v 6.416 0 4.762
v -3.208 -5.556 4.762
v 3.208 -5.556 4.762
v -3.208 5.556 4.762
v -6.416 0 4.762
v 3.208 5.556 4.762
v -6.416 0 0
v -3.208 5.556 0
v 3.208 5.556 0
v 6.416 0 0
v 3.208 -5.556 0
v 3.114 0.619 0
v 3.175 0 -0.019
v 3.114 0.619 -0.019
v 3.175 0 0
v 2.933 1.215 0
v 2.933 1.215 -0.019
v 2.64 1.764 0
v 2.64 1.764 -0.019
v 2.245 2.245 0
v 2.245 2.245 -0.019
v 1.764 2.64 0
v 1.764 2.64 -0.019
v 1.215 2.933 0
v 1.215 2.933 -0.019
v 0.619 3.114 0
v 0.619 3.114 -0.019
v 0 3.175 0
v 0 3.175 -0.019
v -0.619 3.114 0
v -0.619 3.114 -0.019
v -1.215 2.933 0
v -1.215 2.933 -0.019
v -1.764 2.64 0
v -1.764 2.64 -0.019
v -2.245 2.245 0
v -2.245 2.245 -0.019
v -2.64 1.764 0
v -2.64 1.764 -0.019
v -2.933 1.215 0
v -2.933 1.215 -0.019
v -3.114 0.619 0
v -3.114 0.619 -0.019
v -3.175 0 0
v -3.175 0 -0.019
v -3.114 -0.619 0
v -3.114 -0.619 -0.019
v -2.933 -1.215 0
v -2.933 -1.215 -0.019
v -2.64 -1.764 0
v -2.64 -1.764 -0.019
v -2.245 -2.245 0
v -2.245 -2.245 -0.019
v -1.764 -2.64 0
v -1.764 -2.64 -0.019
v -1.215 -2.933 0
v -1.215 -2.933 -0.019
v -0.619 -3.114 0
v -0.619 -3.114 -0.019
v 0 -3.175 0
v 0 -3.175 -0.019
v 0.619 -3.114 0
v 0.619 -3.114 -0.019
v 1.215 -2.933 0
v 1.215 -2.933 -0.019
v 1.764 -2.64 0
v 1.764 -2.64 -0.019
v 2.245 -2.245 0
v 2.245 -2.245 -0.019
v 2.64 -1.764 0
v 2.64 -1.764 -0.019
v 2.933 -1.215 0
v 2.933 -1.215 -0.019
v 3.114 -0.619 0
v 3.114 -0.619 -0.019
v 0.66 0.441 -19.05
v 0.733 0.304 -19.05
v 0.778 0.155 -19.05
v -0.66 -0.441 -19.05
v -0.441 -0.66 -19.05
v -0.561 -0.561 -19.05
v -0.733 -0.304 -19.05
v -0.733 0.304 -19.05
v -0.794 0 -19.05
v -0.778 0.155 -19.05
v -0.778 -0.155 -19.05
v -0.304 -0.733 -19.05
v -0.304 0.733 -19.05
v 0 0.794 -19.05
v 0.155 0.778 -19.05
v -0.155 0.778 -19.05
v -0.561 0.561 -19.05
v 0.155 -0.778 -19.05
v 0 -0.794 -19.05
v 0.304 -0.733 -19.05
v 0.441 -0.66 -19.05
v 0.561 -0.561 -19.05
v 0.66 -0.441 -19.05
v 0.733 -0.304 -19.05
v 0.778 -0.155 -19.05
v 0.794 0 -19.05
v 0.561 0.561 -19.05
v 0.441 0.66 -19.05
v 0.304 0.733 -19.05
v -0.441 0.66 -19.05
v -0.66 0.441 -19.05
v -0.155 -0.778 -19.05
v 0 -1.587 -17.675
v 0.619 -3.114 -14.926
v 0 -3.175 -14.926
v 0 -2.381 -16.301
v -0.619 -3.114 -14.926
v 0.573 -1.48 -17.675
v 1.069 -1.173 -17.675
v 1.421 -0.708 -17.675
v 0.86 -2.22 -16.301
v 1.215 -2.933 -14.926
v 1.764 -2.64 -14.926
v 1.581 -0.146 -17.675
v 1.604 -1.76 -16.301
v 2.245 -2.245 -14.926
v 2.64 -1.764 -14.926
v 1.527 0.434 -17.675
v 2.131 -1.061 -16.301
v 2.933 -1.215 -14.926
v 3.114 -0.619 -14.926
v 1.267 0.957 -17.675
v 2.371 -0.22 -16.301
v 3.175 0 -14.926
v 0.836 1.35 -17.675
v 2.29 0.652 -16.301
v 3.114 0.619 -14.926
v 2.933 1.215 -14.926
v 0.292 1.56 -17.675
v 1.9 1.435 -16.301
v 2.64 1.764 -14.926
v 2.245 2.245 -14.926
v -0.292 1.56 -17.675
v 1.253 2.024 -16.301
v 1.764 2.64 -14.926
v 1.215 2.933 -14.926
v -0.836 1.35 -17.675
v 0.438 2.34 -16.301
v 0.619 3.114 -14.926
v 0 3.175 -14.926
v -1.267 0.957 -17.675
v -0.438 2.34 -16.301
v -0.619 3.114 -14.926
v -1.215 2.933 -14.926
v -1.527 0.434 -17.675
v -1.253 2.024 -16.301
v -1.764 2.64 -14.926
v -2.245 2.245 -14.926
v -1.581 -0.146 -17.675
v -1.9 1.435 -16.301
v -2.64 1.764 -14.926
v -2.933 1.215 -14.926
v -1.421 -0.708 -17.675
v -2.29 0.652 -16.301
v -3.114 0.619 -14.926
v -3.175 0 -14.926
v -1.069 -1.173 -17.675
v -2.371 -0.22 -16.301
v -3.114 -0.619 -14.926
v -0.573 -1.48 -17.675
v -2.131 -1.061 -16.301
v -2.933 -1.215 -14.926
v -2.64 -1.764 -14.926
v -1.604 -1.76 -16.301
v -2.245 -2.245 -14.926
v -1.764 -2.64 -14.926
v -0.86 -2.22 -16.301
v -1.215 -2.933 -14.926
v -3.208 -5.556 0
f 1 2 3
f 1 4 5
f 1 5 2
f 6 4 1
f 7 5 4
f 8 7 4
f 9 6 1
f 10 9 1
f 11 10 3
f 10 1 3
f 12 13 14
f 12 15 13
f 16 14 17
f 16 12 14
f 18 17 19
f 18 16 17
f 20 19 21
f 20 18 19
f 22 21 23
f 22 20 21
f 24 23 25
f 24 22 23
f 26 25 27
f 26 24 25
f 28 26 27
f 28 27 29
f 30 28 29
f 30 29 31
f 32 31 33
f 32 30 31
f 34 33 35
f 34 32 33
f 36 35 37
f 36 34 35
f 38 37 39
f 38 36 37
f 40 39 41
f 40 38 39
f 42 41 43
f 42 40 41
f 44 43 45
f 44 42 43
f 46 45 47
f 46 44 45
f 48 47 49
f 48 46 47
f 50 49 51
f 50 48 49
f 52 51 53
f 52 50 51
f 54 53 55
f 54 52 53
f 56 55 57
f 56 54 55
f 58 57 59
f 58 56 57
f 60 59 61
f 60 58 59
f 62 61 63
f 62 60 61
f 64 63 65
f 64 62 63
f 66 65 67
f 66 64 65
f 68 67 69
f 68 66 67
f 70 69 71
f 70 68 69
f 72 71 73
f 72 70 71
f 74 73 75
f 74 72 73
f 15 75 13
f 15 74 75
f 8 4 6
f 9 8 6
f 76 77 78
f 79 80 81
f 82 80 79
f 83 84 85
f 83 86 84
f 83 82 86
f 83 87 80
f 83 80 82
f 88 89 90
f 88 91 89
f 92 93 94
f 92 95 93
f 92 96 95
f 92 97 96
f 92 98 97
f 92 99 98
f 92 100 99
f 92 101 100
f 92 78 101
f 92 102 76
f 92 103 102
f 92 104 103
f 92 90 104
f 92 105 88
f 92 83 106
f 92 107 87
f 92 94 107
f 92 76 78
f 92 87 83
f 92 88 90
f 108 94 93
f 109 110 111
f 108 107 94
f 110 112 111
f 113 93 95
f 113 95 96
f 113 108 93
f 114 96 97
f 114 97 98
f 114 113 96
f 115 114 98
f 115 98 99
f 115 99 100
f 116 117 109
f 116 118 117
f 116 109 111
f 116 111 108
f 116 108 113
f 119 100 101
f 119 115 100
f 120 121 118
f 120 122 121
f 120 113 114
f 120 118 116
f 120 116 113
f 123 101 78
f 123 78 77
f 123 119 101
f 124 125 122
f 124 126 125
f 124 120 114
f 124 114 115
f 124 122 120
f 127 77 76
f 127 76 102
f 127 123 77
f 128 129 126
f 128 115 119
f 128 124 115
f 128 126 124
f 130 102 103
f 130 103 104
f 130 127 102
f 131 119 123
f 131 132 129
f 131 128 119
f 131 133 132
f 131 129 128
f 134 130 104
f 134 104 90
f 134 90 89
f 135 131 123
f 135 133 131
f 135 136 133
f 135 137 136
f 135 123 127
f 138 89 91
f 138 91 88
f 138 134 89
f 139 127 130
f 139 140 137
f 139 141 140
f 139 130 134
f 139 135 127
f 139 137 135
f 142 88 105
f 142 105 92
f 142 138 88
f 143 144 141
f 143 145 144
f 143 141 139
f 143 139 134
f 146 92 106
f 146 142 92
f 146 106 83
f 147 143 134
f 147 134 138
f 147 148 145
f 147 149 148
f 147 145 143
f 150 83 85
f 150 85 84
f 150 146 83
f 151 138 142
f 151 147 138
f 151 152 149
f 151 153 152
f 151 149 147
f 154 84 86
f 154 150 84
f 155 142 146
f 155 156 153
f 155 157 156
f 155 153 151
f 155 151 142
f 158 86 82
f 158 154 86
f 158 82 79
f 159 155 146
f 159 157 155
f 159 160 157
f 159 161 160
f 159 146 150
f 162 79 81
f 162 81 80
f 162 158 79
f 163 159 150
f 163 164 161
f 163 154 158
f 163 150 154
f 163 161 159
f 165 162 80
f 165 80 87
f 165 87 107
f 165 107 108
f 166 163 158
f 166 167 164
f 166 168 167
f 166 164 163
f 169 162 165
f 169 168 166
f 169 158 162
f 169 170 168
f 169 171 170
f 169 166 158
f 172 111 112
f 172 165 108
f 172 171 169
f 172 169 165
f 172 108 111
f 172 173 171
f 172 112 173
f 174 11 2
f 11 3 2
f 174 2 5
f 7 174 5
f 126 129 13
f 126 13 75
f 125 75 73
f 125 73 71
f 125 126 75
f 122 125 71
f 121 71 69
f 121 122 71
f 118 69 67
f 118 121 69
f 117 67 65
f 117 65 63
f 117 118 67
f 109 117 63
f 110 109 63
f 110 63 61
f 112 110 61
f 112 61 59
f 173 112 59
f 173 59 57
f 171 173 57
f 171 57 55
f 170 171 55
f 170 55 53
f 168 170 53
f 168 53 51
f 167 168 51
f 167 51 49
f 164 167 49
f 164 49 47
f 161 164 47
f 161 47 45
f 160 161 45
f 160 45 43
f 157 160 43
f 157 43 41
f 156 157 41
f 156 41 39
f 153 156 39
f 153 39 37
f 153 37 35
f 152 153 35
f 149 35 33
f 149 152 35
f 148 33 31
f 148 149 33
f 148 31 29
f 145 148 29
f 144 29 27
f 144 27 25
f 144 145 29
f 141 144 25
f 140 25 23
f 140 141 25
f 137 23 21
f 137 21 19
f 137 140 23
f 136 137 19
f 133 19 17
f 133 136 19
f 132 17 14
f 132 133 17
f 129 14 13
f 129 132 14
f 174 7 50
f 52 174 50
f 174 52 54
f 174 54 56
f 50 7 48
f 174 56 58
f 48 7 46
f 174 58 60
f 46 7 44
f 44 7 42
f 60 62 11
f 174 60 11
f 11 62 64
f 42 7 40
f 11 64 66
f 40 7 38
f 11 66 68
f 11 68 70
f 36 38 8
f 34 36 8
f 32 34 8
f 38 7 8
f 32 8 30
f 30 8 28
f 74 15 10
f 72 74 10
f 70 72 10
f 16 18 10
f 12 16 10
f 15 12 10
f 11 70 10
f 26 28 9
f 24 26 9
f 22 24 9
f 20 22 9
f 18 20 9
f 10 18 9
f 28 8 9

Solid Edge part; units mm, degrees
sketch "Sketch1" plane through (0, 0, 0) normal (0, 0, 1) x (1, 0, 0)
  circle A0 centre (0, 0) radius 6.4452
  dimension "D1" = 12.8905
extrude "Protrusion1" add sketch "Sketch1" along normal blind 4.7625
sketch "Sketch2" plane through (0, 0, 0) normal (0, 0, -1) x (1, 0, 0)
  circle A0 centre (0, 0) radius 3.175
extrude "Protrusion2" add sketch "Sketch2" along normal blind 19.05
sketch "Sketch3" plane through (0, 0, -19.05) normal (0, 0, -1) x (1, 0, 0)
  circle A0 centre (0, 0) radius 3.1747
extrude "Cutout1" cut sketch "Sketch3" against normal blind 19.0309 flip side to cut
sketch "Sketch4" plane through (0, 0, 4.7625) normal (0, 0, 1) x (1, 0, 0)
  line L0 (-3.2664, 5.5562) -> (3.2664, 5.5562)
  dimension "D1" = 11.1125
extrude "Cutout2" cut sketch "Sketch4" against normal up to next material side at (0, 5.6062, 4.7625)
sketch "Sketch5" plane through (0, 0, 0) normal (1, 0, 0) x (0, 1, 0)
  line L0 (-0.7937, -19.05) -> (-3.1747, -14.926)
  dimension "D1" = 0.7937
revolve "RevolvedCutout1" cut sketch "Sketch5" angle 360 about axis through (0, 0, -14.7796) along (0, 0, 1) material side at (0, -2.0275, -17.013)
pattern_circular "Pattern1" count 6 over 360 about axis through (0, 0, 4.7625) along (0, 0, 1) of "Cutout2"
properties part number "24101329"
